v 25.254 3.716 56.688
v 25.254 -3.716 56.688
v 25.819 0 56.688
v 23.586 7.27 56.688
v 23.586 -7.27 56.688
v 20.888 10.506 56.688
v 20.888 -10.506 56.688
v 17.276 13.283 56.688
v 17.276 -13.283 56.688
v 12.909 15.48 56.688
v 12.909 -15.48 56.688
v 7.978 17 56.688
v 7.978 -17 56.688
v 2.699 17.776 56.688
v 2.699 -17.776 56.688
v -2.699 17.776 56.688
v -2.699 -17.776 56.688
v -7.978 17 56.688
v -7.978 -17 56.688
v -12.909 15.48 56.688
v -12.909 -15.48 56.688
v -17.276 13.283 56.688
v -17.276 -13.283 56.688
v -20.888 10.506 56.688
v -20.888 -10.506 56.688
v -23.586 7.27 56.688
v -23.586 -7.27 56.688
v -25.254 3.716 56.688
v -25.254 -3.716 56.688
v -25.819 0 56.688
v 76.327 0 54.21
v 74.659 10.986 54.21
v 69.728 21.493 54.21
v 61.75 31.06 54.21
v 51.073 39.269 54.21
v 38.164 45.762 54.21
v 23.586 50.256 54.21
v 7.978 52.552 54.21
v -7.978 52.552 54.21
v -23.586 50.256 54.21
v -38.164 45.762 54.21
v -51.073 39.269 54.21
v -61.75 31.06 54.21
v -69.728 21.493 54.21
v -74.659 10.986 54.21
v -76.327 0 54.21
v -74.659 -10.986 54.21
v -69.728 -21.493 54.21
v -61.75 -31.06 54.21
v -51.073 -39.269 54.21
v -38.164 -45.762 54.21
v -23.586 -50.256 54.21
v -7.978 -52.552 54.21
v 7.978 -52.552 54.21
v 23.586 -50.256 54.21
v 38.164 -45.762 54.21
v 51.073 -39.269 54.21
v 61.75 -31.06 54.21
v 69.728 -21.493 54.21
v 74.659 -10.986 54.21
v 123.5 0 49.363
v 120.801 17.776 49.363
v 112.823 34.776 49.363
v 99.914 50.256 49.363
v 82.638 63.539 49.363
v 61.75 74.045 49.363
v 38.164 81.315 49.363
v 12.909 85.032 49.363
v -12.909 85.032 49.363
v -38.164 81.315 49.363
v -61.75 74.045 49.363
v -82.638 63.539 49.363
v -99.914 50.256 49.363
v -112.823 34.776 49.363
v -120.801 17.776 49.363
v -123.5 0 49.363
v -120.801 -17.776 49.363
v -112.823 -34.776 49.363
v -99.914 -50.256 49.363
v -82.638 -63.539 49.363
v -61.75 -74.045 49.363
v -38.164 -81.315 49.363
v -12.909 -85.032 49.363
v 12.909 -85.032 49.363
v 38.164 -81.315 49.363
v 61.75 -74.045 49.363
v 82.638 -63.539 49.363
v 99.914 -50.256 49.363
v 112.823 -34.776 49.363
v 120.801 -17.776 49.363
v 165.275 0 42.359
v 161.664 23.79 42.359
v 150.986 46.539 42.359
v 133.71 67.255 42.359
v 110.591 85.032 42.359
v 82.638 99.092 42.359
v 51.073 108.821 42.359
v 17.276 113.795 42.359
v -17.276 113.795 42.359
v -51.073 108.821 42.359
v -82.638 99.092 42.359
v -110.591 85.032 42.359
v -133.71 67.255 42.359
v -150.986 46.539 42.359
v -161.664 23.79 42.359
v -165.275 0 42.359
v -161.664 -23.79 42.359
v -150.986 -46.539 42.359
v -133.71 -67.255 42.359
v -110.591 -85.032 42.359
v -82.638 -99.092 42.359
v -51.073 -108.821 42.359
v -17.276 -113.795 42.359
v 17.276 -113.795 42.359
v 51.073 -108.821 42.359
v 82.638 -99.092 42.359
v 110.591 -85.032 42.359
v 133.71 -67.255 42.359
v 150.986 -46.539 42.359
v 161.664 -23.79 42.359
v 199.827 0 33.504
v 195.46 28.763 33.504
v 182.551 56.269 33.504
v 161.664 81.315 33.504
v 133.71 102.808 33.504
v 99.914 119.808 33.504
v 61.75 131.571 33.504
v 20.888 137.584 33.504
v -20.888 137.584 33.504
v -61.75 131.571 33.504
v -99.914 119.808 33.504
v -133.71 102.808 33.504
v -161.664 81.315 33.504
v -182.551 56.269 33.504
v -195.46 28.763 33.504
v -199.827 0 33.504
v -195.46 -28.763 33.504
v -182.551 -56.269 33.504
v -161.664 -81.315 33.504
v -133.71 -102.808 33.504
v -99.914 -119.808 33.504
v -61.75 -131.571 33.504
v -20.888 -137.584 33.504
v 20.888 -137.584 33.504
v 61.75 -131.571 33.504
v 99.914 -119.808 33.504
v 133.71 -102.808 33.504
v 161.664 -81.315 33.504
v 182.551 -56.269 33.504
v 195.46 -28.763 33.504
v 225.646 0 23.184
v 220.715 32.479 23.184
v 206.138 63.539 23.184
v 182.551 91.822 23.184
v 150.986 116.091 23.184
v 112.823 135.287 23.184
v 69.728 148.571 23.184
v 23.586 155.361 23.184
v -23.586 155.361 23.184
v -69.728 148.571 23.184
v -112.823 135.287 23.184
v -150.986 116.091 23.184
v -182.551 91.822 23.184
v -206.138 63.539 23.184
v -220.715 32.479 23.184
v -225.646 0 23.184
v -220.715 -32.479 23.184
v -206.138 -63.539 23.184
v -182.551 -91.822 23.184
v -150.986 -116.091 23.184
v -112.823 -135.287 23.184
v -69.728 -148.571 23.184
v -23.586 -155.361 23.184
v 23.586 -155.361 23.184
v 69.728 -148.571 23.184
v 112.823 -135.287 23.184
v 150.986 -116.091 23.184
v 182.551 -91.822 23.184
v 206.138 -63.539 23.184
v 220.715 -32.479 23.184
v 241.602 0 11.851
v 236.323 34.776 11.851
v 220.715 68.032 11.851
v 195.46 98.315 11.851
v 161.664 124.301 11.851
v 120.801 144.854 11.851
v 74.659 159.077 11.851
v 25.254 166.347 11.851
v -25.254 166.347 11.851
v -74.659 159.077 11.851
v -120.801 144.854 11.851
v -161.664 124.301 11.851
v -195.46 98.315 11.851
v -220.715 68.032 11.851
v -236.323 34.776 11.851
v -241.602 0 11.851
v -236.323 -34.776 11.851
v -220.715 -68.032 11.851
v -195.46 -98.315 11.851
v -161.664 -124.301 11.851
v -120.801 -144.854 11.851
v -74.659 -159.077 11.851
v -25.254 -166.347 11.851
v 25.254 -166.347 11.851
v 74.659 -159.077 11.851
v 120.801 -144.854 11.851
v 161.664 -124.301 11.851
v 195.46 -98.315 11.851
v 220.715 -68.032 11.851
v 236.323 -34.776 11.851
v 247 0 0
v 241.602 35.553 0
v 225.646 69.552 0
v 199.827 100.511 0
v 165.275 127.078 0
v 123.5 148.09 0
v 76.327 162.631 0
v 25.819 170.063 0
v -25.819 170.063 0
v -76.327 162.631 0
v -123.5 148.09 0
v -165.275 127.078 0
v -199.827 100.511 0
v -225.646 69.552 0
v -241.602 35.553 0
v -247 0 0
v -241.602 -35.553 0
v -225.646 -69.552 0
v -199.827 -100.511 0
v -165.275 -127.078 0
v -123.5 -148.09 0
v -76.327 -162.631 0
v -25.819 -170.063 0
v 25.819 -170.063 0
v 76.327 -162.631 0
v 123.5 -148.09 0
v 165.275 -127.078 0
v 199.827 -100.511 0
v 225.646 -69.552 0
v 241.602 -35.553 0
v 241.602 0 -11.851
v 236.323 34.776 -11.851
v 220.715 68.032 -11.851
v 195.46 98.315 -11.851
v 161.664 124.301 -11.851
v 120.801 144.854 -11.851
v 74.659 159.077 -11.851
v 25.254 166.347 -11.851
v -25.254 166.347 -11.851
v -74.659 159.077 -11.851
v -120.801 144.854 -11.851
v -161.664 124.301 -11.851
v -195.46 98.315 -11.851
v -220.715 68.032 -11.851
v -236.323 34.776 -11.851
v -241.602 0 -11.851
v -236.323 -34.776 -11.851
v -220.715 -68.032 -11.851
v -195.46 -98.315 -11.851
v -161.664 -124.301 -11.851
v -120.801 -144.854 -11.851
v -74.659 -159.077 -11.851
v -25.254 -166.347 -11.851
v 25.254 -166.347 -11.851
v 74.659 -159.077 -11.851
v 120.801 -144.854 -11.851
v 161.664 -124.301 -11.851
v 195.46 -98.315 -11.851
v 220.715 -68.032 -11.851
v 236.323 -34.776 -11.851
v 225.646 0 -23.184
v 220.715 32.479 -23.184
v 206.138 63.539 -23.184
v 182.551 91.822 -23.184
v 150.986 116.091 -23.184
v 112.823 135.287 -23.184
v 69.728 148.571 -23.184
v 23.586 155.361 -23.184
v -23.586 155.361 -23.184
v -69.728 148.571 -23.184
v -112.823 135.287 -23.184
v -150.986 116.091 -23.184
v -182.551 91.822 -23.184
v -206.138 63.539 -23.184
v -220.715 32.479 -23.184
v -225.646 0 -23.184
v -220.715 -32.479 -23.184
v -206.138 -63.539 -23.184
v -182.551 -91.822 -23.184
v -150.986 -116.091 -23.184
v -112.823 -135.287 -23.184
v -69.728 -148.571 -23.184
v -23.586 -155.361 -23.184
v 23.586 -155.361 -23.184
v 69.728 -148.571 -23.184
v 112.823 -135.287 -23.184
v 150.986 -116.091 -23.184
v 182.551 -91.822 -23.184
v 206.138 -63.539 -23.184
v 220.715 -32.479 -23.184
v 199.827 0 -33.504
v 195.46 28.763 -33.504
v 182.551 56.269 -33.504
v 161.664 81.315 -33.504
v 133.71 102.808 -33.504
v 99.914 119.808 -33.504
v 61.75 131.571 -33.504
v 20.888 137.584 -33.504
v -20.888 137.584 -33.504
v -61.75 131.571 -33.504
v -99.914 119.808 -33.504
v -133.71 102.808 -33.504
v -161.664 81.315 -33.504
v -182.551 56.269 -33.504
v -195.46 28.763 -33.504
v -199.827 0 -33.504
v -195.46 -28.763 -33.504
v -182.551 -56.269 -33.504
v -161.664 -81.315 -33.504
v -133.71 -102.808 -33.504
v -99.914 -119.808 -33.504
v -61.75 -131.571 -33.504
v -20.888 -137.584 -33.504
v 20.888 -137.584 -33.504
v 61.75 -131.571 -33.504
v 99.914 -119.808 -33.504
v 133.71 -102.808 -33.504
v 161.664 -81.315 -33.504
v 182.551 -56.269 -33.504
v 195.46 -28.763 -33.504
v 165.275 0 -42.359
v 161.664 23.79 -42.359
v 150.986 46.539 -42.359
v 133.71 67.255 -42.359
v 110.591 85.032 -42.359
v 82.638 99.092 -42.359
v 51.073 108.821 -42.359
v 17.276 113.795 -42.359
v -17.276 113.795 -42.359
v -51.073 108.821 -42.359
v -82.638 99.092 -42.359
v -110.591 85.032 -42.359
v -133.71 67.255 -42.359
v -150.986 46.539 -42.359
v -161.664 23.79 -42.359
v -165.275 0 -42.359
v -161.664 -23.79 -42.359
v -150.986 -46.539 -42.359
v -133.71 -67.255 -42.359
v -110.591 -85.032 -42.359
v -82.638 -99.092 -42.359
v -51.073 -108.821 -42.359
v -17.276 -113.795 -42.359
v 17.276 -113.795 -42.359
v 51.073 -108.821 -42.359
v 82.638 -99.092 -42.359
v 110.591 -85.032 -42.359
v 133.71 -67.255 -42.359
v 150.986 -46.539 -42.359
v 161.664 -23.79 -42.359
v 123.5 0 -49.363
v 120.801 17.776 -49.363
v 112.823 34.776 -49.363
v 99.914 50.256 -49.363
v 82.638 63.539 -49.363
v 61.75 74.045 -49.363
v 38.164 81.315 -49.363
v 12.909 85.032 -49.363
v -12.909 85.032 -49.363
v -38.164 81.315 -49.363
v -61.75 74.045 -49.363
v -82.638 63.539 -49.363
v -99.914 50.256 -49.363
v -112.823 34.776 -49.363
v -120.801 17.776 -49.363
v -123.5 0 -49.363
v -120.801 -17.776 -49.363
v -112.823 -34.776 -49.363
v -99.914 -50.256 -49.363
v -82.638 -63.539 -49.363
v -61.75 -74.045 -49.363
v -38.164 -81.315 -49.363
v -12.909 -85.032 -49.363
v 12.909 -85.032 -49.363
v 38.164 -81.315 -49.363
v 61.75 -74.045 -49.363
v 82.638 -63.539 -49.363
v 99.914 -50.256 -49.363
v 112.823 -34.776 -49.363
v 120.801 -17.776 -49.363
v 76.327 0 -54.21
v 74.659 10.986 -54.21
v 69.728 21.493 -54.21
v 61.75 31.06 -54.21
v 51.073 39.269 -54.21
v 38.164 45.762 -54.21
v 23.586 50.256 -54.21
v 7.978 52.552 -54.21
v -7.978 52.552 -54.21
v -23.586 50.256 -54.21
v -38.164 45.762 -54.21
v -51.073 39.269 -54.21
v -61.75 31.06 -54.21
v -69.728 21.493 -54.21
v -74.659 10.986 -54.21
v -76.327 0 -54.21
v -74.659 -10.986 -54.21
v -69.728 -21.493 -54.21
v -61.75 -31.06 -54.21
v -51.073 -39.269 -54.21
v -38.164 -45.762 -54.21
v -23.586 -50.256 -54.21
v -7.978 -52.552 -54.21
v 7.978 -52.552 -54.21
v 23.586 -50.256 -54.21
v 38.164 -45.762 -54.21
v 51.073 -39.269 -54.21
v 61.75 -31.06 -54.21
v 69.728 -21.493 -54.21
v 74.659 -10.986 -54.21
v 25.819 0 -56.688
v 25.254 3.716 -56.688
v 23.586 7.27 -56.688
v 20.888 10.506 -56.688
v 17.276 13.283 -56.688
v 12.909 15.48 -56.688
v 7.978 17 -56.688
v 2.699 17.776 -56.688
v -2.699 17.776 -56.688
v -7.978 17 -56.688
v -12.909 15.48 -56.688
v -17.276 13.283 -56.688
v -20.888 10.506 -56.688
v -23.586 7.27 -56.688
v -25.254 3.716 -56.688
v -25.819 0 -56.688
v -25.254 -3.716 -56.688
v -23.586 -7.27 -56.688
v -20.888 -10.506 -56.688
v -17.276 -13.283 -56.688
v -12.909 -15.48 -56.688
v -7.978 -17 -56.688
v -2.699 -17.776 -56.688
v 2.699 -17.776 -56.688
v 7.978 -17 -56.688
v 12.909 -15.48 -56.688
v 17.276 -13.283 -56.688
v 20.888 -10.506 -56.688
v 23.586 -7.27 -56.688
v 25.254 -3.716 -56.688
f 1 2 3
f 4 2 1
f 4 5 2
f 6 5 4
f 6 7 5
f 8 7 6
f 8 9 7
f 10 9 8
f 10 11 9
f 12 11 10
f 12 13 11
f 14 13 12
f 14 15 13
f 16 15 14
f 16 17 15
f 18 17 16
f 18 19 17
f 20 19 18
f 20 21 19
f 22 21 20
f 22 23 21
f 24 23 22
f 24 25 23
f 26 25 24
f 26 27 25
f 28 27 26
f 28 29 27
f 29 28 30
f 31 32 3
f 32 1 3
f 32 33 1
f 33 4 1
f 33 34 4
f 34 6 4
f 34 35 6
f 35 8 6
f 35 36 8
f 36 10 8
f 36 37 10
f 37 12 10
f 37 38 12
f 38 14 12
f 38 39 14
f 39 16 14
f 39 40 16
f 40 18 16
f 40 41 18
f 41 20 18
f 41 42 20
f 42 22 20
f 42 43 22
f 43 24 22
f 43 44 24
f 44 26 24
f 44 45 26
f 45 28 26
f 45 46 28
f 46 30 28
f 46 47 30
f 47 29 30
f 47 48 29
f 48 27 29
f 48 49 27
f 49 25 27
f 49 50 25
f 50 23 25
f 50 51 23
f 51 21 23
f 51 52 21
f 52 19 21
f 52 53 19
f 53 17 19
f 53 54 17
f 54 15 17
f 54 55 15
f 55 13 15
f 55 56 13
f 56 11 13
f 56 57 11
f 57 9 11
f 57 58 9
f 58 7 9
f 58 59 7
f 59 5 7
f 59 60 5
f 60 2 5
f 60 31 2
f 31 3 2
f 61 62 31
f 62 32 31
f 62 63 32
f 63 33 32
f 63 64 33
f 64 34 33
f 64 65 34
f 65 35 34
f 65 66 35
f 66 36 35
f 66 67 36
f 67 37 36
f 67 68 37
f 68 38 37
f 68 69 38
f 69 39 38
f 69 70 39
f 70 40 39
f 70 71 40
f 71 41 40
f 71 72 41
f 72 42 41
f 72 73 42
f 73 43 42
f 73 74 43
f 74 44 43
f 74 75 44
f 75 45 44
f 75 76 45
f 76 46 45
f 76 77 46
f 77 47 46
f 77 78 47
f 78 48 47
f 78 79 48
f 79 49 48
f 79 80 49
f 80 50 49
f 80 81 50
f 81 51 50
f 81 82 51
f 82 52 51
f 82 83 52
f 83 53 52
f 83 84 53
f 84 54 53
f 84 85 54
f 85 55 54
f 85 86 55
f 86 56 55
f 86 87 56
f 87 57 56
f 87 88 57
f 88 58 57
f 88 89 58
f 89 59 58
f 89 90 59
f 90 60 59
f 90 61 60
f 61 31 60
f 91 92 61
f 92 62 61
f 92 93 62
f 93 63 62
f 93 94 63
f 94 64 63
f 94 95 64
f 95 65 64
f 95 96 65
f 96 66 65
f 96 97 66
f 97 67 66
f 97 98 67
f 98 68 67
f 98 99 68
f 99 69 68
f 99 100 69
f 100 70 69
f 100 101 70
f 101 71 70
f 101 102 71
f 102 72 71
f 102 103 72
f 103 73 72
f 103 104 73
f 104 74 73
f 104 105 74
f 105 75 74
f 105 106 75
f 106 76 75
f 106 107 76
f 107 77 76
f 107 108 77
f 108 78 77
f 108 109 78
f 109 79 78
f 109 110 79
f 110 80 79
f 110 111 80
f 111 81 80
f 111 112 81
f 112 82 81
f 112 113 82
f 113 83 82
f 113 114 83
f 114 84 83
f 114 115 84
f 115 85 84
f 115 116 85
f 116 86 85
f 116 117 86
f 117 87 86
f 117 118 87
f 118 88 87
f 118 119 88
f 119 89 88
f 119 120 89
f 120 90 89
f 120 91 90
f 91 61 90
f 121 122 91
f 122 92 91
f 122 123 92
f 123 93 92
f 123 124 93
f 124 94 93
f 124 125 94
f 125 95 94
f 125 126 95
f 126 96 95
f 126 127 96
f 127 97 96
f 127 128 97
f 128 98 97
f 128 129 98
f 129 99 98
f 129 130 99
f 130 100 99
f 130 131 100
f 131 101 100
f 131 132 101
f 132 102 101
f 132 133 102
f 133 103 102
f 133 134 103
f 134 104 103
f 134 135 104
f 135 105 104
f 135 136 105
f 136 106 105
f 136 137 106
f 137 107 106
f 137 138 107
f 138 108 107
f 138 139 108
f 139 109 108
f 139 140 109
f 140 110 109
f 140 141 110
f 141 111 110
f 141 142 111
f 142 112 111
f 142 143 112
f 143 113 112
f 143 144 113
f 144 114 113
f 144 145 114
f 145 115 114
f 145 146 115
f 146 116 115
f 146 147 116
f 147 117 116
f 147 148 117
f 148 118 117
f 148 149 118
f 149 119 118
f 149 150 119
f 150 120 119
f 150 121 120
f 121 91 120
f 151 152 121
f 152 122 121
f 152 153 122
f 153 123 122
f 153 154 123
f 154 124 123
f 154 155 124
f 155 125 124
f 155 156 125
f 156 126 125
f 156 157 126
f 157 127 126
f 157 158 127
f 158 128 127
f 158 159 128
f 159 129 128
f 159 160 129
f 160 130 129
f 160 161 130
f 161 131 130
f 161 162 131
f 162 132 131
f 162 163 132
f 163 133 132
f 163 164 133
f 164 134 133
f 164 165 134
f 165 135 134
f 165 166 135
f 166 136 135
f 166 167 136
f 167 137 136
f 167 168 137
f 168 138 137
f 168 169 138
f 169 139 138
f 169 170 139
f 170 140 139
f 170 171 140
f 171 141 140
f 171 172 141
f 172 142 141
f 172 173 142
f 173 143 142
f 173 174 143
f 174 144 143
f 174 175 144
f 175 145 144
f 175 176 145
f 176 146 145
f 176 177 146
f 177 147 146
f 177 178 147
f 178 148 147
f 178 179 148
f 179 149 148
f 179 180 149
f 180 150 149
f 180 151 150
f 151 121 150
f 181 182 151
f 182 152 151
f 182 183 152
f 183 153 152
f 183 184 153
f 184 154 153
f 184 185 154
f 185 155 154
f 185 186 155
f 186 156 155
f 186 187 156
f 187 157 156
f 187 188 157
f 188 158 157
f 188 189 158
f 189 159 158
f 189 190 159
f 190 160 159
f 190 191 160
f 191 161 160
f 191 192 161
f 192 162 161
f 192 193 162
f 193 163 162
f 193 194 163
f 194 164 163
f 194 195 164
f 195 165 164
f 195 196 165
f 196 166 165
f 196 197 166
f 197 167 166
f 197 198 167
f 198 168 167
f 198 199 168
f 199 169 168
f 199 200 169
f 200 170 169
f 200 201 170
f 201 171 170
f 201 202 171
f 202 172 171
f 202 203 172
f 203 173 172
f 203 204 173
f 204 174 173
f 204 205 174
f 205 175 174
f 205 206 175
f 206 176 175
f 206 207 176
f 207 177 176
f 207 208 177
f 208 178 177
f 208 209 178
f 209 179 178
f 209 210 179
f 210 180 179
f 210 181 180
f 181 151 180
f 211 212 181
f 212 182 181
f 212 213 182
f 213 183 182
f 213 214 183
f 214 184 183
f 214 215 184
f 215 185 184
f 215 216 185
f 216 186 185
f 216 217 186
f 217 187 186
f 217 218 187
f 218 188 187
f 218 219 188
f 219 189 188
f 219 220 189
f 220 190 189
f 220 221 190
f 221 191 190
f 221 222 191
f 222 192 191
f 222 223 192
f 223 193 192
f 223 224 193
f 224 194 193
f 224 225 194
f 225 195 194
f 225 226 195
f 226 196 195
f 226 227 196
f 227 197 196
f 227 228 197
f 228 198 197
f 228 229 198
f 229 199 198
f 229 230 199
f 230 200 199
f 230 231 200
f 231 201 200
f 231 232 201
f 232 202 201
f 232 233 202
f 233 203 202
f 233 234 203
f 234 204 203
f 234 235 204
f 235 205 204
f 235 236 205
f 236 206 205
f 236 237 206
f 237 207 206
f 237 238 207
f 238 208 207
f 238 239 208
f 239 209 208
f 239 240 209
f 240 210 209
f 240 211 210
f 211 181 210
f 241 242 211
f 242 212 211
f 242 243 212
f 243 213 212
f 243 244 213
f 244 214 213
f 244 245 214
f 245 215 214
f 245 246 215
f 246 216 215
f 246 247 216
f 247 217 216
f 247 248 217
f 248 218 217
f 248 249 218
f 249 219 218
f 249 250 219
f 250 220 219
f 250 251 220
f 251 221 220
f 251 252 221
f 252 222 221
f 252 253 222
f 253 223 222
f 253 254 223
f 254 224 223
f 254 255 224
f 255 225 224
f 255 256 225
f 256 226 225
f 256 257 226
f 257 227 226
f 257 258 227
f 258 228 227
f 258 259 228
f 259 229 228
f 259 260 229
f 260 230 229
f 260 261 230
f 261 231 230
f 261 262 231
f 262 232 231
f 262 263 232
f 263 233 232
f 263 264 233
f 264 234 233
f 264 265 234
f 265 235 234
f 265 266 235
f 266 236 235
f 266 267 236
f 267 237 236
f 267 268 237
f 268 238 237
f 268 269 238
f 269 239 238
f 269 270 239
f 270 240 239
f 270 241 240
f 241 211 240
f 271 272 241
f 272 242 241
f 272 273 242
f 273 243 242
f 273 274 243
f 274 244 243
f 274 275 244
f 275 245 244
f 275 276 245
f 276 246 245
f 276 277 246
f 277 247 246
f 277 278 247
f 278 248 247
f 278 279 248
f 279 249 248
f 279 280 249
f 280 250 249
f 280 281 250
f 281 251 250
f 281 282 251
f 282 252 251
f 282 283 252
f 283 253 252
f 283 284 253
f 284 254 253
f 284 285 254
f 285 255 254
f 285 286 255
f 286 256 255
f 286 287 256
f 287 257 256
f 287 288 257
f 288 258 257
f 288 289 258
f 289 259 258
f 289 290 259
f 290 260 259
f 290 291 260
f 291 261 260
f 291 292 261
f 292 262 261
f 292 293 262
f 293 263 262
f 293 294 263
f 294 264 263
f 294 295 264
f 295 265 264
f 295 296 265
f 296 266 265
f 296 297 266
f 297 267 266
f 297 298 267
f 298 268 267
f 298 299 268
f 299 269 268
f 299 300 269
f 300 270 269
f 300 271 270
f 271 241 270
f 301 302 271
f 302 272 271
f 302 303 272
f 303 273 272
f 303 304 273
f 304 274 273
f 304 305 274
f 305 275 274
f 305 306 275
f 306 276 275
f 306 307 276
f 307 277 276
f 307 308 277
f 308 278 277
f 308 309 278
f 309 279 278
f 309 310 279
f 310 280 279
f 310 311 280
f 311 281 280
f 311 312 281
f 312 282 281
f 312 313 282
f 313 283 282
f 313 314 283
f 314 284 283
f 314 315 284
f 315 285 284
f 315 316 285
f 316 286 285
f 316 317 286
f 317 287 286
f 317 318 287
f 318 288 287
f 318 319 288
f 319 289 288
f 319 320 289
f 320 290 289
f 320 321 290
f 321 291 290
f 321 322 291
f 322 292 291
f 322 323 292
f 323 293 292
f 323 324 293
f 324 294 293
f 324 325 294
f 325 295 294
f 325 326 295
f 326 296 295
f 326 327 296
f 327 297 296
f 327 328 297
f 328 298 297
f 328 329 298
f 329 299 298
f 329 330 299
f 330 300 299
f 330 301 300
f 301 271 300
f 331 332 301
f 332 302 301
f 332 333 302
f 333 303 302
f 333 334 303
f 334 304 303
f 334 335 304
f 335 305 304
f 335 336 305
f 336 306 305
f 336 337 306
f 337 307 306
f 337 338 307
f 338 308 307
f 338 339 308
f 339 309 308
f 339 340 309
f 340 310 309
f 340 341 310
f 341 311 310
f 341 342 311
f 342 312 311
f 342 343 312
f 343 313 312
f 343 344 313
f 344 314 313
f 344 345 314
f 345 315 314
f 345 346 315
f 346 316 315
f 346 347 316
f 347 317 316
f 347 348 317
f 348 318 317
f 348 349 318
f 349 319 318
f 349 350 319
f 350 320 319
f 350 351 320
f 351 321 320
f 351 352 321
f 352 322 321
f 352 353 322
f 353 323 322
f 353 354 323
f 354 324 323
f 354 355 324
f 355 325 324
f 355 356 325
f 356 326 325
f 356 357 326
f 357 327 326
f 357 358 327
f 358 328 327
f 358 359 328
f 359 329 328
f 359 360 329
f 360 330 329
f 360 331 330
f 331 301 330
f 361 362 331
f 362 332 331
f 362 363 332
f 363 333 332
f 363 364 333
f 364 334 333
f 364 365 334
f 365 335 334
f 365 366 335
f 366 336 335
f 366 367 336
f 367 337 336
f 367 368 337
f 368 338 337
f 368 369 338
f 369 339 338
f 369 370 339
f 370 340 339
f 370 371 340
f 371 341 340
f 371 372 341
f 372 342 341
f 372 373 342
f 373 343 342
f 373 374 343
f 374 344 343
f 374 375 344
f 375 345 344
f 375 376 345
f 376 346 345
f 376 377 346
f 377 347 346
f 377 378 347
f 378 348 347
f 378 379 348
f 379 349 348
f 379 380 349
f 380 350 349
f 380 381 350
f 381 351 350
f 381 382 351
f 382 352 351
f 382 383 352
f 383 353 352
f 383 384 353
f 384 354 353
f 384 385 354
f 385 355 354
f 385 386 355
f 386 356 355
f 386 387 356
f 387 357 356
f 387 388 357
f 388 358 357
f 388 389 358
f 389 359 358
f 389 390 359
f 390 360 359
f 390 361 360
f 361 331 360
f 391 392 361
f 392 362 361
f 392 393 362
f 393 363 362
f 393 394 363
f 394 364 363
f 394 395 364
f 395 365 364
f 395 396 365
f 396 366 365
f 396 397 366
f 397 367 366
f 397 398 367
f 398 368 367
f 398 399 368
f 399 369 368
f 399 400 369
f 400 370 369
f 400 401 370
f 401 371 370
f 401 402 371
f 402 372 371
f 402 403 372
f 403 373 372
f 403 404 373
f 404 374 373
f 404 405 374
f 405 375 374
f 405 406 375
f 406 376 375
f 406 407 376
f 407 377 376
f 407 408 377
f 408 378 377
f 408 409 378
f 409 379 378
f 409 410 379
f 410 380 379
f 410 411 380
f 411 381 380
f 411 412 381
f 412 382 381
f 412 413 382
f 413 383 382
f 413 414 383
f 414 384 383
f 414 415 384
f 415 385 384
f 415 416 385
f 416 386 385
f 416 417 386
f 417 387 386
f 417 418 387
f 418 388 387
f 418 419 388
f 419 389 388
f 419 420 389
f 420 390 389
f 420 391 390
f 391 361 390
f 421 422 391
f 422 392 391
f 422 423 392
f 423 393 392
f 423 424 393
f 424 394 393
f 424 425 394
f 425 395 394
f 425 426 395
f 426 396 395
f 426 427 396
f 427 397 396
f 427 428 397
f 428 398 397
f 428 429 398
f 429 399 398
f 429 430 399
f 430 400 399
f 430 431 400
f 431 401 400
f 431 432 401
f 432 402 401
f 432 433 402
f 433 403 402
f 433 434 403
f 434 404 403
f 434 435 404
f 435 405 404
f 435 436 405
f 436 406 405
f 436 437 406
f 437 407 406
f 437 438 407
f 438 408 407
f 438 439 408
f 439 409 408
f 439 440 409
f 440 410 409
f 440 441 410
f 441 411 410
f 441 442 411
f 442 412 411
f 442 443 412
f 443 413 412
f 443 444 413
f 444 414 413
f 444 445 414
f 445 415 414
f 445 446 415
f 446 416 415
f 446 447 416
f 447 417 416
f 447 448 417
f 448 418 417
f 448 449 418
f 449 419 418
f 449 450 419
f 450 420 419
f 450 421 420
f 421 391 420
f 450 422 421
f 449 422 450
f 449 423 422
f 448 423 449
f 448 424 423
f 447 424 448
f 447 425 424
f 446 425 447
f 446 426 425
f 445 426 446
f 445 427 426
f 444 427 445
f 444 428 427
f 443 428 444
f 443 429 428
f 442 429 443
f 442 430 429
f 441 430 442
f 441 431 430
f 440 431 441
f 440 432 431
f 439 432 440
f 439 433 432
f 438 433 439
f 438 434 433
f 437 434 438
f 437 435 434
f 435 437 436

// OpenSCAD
// Generated by SolidPython 1.0.1 on 2020-07-29 00:46:50


scale(v = [13, 9, 3]) {
	sphere(r = 19);
}
/***********************************************
*********      SolidPython code:      **********
************************************************
 
# import packages: SolidPython
from solid import *
from solid.utils import *
from itertools import chain, combinations, permutations


class Resize:

    def __init__(self, scad_file):
        self.scad_file = scad_file
        #self.scad_file = import_scad(scad_file)
        # cone/cylinder param:
        self.r1 = 0
        self.r2 = 0
        self.h = 0
        # rectangular prism param:
        self.w = 0
        self.l = 0
        # ellipse param:
        self.r = 0

    # import OpenScad code (file name corresponds to shape)


    # classify shape + parameters
    def assign(self, param1, param2, param3):
        if self.scad_file == 'cone.scad':
            self.r1 = param1
            self.r2 = param2
            self.h = param3
        elif self.scad_file == 'cylinder.scad':
            self.r1 = param1
            self.r2 = param2
            self.h = param3
        elif self.scad_file == 'rectangularPrism.scad':
            self.h = param1
            self.l = param2
            self.w = param3
        else:
            self.r = param1
            self.h = param2

    # resize parameters
    def iterate(self):
        x = range(3, 20, 2)
        i = 1
        if self.scad_file == 'cone.scad':
            tempList = list(permutations(x, 2))
            for temp in tempList:
                param1 = temp[0]
                param2 = temp[1]
                filepath = 'produced_scad_files/' + 'cone' + str(param1) + '_' + str(param2) + '_' + '.scad'
                scad_render_to_file(cylinder(h=param1, r1=param2, r2=0), filepath)

        elif self.scad_file == 'cylinder.scad':
            tempList = list(permutations(x, 3))
            for temp in tempList:
                param1 = temp[0]
                param2 = temp[1]
                filepath = 'produced_scad_files/' + 'cylinder' + str(param1) + '_' + str(param2) + '_' + '.scad'
                scad_render_to_file(cylinder(h=param1, r1=param2, r2=param2), filepath)

        elif self.scad_file == 'rectangularPrism.scad':
            tempList = list(permutations(x, 3))
            for temp in tempList:
                param1 = temp[0]
                param2 = temp[1]
                param3 = temp[2]
                filepath = 'produced_scad_files/' + 'rectangularPrism' + str(param1) + '_' + str(param2) + '_' + str(
                    param3) + '.scad'
                scad_render_to_file(cube(size=(param1, param2, param3)), filepath)

        elif self.scad_file == 'ellipse.scad':
            tempList = list(permutations(x, 4))
            for temp in tempList:
                param1 = temp[0]
                param2 = temp[1]
                param3 = temp[2]
                param4 = temp[3]
                filepath = 'produced_scad_files/' + 'ellipse' + str(param1) + '_' + str(param2) + '_' + str(param3) + '_' + str(param4) + '.scad'
                scad_render_to_file(scale([param1, param2, param3])(sphere(r=param4)), filepath)

    def render_to_scadfile(self):
        scad_render_to_file(scad, 'example.scad') 
 
************************************************/
